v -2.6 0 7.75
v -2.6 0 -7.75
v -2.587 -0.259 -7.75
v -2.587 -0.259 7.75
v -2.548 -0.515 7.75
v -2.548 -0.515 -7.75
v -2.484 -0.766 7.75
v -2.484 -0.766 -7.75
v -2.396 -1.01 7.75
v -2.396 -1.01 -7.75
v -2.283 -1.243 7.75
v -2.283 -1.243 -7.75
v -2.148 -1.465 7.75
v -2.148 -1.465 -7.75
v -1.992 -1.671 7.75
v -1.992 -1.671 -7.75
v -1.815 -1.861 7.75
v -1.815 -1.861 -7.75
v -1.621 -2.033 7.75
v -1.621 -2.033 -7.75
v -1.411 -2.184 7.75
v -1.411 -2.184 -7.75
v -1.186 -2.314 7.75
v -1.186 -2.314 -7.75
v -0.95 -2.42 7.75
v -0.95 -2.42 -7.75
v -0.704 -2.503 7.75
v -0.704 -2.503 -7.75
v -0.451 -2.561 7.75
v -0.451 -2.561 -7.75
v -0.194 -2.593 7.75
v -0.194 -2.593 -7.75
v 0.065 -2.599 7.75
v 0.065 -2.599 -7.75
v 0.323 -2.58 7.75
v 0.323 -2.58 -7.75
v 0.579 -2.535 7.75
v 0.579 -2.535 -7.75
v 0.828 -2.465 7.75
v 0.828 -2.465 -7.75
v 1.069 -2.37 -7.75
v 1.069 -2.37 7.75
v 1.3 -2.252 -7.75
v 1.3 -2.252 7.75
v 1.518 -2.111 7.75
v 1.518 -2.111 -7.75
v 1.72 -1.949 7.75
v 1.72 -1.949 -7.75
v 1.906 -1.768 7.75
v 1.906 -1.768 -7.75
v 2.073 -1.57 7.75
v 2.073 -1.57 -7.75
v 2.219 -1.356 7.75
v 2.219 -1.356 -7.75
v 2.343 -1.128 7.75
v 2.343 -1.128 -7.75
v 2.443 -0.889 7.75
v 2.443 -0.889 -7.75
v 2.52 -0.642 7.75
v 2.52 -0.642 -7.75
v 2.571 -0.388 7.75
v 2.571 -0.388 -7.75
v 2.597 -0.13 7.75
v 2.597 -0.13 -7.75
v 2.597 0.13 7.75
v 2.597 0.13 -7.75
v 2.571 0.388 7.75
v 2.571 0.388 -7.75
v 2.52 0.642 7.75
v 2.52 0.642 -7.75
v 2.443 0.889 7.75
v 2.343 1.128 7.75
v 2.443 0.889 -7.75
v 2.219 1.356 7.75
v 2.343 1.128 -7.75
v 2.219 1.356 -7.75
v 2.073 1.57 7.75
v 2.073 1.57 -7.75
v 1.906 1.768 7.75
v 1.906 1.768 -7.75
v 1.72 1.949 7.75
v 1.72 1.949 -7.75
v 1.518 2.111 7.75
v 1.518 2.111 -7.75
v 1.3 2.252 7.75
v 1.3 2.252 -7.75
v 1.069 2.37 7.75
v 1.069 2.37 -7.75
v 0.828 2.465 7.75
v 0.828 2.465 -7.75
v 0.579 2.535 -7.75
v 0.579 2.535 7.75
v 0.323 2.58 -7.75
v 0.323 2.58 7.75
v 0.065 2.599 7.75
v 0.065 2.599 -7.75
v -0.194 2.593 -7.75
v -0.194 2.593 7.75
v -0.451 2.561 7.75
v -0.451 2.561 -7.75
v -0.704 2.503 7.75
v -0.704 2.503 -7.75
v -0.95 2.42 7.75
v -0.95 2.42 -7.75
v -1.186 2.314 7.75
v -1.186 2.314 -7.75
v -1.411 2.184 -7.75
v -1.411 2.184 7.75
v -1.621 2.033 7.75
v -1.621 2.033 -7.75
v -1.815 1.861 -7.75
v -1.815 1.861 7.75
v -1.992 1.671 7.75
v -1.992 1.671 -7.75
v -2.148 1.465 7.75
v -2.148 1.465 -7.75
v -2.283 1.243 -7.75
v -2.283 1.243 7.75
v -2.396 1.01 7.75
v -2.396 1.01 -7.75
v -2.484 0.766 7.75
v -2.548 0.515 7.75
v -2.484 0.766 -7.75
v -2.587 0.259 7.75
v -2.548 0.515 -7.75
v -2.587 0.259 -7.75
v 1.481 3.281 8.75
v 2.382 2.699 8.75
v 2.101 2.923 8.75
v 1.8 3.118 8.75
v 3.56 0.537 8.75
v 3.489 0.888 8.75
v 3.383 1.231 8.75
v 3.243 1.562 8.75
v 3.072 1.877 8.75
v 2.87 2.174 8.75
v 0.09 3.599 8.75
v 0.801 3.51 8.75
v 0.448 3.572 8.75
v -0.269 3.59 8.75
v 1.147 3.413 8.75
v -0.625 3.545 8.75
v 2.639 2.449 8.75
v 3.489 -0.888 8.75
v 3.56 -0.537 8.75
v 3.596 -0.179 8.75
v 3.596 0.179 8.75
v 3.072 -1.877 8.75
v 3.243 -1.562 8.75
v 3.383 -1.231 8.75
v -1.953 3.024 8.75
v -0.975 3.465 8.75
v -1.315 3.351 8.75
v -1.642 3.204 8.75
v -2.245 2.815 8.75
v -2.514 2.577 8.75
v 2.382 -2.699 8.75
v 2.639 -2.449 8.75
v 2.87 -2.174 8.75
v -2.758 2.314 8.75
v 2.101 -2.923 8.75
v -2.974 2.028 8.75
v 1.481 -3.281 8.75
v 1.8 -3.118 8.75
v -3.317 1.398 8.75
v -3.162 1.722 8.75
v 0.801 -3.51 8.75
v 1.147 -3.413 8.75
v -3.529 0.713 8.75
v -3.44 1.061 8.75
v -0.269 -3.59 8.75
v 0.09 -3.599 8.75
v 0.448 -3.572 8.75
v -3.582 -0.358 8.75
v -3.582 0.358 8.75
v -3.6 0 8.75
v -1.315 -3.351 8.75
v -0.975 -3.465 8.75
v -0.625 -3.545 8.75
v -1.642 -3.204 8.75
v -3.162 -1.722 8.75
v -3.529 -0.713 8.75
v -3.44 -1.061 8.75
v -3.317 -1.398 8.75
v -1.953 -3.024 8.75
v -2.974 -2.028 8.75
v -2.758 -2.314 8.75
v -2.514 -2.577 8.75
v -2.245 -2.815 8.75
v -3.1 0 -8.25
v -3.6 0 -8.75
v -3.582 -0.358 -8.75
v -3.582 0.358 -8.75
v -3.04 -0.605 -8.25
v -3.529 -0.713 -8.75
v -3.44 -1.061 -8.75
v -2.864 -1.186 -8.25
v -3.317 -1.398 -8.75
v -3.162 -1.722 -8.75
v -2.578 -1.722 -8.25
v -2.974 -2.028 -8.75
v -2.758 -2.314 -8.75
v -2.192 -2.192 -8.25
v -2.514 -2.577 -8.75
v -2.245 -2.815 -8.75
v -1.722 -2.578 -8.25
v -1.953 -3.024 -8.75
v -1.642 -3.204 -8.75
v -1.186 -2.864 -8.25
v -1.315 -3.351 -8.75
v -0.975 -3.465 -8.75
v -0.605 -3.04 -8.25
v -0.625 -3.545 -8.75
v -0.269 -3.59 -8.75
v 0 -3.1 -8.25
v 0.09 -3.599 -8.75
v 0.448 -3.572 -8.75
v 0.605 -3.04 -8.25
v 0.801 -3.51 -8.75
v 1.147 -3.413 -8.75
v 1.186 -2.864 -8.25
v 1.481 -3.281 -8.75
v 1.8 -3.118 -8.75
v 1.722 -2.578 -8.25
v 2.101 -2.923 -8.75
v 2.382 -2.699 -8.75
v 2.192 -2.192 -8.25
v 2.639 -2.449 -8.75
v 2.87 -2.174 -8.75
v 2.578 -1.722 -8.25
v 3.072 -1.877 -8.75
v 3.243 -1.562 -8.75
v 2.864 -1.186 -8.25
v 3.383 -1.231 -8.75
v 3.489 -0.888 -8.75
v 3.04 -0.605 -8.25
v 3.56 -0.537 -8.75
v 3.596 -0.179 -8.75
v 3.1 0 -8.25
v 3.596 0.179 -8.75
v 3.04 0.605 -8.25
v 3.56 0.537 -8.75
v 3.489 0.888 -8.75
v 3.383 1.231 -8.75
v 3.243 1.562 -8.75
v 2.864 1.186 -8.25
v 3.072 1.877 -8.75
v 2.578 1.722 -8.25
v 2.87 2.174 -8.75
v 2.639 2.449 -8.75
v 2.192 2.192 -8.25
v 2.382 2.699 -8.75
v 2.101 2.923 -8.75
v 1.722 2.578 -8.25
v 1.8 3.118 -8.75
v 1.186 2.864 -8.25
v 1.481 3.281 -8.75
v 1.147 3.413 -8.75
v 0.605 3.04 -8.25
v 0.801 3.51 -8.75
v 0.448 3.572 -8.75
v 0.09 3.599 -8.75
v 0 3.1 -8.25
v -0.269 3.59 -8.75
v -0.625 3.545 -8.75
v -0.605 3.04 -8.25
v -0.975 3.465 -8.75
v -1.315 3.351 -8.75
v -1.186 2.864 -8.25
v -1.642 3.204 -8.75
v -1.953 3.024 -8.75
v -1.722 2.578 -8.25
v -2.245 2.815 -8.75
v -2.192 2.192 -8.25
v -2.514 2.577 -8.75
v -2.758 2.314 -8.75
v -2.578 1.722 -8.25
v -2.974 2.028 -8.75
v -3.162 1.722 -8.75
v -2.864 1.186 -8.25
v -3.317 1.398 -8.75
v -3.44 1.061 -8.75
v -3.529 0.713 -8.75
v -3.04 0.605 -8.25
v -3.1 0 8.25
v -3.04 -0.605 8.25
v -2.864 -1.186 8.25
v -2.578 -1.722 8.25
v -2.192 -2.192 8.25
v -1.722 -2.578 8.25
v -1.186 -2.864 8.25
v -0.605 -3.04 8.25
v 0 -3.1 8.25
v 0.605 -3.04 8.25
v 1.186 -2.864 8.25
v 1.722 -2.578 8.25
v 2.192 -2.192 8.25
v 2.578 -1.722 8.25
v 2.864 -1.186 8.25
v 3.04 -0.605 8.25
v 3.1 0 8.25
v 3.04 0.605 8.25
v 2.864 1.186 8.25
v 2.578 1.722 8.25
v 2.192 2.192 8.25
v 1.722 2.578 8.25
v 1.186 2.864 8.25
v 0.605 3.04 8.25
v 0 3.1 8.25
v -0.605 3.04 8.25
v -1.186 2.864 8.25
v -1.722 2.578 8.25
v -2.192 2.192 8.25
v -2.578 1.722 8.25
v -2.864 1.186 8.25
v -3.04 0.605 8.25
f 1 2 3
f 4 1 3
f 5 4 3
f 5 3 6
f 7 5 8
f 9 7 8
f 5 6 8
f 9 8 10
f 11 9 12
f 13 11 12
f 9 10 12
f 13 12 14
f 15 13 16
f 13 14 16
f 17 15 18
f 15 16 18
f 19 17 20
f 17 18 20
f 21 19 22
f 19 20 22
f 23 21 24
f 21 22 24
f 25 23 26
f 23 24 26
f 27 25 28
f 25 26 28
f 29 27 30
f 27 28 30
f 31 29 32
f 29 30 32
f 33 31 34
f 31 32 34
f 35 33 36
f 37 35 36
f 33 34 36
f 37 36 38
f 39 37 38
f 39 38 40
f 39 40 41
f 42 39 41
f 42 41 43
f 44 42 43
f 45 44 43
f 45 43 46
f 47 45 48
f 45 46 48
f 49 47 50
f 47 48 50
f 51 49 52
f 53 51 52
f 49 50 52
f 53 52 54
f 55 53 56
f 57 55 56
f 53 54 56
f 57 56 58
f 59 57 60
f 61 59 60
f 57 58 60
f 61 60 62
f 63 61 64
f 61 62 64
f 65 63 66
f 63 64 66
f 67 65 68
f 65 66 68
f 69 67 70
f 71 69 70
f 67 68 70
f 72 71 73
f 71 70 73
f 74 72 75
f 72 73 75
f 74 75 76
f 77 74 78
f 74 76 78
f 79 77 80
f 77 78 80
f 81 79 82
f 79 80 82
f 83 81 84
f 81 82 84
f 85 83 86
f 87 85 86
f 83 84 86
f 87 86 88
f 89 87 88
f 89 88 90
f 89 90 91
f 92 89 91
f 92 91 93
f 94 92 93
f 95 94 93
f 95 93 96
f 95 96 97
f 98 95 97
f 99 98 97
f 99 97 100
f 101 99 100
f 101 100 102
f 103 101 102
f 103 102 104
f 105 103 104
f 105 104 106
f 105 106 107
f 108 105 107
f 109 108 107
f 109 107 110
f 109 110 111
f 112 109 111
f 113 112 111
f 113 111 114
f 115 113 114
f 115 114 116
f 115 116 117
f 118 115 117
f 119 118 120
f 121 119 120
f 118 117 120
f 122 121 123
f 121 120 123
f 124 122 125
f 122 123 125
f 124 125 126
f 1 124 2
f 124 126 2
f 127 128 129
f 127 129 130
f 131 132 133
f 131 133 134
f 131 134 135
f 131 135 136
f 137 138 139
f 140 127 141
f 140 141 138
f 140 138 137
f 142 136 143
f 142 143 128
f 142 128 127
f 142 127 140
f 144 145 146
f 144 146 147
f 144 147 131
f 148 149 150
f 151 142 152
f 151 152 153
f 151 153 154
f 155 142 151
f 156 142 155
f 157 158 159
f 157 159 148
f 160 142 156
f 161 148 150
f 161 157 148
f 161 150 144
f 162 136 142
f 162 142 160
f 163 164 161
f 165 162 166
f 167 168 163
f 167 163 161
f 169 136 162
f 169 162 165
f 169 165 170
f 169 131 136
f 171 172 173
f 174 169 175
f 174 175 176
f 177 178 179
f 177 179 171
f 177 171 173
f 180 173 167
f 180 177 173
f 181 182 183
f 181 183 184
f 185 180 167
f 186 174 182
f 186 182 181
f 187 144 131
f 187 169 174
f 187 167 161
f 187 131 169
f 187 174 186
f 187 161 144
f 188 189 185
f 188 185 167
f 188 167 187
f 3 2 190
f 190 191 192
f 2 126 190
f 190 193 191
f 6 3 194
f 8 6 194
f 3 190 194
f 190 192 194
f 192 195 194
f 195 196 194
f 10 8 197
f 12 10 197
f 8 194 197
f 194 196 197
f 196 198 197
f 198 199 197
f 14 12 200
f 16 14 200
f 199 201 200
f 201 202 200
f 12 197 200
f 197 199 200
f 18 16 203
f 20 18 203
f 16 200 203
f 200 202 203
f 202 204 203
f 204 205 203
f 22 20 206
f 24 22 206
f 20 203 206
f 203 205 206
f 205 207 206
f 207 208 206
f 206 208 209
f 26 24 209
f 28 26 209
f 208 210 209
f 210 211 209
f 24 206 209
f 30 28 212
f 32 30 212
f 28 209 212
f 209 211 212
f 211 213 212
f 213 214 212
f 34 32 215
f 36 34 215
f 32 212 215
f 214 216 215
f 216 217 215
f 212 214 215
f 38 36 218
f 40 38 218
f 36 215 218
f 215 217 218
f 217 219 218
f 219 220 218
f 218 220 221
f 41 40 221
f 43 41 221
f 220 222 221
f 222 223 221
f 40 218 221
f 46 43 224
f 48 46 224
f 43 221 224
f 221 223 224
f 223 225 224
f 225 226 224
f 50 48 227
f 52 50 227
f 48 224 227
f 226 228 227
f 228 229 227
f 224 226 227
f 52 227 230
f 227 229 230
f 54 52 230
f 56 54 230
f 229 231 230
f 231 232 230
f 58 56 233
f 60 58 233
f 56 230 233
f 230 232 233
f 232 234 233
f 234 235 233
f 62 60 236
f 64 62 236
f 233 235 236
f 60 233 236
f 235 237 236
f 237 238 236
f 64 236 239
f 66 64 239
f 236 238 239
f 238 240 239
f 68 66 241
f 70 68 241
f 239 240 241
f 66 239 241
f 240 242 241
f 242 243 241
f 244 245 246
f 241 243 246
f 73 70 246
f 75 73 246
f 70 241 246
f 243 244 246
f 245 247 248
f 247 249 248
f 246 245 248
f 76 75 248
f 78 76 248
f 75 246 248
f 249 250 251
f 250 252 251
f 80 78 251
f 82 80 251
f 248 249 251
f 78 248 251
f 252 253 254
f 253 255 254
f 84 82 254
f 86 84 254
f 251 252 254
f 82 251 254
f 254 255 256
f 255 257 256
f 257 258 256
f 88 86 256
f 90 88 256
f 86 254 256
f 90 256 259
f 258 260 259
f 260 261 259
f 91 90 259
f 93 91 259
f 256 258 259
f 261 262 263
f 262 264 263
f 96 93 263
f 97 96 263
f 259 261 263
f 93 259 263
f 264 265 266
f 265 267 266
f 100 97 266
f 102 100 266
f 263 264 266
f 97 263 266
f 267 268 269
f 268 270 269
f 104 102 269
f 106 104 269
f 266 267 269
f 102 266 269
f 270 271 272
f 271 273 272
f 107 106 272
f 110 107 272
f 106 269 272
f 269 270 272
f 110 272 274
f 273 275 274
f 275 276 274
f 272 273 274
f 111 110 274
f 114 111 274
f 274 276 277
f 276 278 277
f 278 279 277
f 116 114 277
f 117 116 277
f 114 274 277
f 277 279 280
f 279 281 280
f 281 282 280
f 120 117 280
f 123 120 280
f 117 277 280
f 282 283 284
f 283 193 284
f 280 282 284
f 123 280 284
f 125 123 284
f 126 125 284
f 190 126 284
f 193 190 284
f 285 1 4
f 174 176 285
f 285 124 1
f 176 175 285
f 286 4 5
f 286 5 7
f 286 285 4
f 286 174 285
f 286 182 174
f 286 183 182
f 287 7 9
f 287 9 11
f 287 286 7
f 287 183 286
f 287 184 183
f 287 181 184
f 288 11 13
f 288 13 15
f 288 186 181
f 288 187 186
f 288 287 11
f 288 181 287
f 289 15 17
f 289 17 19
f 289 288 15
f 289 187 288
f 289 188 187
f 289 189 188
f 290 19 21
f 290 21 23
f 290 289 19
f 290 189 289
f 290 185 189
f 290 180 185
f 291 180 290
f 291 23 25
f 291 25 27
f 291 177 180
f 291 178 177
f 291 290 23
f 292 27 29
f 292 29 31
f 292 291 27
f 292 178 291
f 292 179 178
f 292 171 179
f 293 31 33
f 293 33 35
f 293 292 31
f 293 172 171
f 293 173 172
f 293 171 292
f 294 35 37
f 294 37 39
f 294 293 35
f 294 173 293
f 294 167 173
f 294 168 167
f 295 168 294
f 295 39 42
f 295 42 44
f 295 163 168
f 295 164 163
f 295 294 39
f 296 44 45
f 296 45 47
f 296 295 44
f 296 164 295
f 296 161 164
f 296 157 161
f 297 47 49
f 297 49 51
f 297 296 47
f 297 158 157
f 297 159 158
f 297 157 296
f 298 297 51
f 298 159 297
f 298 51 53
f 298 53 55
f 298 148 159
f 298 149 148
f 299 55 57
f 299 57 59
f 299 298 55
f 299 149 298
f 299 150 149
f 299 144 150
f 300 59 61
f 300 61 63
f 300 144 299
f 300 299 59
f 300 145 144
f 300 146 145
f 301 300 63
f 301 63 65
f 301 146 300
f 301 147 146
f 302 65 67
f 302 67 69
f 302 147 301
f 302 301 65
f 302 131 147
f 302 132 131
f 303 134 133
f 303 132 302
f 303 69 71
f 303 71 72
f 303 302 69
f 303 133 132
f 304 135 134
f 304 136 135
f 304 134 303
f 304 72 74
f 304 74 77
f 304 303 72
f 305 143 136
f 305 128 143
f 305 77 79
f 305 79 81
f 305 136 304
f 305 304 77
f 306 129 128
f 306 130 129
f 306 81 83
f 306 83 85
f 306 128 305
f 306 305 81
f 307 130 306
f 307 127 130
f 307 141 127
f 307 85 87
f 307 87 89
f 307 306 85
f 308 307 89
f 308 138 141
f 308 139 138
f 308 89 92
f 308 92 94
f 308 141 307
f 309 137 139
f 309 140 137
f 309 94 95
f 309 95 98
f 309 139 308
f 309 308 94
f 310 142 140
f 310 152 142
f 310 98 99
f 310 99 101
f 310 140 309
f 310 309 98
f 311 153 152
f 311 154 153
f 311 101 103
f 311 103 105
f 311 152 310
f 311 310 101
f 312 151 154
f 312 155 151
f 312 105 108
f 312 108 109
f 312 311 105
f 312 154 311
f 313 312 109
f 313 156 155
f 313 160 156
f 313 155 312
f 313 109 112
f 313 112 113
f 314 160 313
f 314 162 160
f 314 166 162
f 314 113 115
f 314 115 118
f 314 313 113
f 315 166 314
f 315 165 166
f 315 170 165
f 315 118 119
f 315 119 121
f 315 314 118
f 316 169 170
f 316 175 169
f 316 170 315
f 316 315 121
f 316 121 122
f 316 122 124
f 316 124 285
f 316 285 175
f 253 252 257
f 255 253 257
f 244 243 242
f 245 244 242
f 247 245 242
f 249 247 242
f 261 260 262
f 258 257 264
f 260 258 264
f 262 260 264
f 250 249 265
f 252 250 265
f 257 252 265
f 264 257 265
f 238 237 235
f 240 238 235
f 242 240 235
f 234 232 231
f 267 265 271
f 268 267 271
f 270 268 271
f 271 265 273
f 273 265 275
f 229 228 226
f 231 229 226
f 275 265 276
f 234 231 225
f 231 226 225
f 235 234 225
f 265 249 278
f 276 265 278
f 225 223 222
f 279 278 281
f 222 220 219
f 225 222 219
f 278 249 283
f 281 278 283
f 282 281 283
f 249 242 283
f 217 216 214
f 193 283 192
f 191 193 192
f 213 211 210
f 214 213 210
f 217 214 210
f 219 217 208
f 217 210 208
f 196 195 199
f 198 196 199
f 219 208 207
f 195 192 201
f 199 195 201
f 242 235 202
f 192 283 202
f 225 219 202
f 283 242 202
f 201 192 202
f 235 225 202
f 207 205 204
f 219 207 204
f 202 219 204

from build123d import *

# Parameters (mm, degrees)
SKETCH1_W = 2.6
SKETCH1_H = 17.5


with BuildPart() as part:
    # Sketch1 → Revolve1 (revolve)
    with BuildSketch(Plane(origin=(0, 0, 0), x_dir=(1, 0, 0), z_dir=(0, 1, 0))):
        with Locations((-1.3, 0)):
            Rectangle(SKETCH1_W, SKETCH1_H)
    revolve(axis=Axis((0, 0, -13.659521107), (0, 0, 1)))

    # Sketch2 → Revolve2 (revolve)
    with BuildSketch(Plane(origin=(0, 0, 0), x_dir=(1, 0, 0), z_dir=(0, 1, 0))):
        Polygon((-2.6, -7.75), (-3.6, -8.75), (-2.6, -8.75), align=None)
    revolve2 = revolve(axis=Axis((0, 0, -14.722770412), (0, 0, 1)))

    # Mirror1: Revolve2 across plane
    add(revolve2.mirror(Plane.XY))


solid = part.part
